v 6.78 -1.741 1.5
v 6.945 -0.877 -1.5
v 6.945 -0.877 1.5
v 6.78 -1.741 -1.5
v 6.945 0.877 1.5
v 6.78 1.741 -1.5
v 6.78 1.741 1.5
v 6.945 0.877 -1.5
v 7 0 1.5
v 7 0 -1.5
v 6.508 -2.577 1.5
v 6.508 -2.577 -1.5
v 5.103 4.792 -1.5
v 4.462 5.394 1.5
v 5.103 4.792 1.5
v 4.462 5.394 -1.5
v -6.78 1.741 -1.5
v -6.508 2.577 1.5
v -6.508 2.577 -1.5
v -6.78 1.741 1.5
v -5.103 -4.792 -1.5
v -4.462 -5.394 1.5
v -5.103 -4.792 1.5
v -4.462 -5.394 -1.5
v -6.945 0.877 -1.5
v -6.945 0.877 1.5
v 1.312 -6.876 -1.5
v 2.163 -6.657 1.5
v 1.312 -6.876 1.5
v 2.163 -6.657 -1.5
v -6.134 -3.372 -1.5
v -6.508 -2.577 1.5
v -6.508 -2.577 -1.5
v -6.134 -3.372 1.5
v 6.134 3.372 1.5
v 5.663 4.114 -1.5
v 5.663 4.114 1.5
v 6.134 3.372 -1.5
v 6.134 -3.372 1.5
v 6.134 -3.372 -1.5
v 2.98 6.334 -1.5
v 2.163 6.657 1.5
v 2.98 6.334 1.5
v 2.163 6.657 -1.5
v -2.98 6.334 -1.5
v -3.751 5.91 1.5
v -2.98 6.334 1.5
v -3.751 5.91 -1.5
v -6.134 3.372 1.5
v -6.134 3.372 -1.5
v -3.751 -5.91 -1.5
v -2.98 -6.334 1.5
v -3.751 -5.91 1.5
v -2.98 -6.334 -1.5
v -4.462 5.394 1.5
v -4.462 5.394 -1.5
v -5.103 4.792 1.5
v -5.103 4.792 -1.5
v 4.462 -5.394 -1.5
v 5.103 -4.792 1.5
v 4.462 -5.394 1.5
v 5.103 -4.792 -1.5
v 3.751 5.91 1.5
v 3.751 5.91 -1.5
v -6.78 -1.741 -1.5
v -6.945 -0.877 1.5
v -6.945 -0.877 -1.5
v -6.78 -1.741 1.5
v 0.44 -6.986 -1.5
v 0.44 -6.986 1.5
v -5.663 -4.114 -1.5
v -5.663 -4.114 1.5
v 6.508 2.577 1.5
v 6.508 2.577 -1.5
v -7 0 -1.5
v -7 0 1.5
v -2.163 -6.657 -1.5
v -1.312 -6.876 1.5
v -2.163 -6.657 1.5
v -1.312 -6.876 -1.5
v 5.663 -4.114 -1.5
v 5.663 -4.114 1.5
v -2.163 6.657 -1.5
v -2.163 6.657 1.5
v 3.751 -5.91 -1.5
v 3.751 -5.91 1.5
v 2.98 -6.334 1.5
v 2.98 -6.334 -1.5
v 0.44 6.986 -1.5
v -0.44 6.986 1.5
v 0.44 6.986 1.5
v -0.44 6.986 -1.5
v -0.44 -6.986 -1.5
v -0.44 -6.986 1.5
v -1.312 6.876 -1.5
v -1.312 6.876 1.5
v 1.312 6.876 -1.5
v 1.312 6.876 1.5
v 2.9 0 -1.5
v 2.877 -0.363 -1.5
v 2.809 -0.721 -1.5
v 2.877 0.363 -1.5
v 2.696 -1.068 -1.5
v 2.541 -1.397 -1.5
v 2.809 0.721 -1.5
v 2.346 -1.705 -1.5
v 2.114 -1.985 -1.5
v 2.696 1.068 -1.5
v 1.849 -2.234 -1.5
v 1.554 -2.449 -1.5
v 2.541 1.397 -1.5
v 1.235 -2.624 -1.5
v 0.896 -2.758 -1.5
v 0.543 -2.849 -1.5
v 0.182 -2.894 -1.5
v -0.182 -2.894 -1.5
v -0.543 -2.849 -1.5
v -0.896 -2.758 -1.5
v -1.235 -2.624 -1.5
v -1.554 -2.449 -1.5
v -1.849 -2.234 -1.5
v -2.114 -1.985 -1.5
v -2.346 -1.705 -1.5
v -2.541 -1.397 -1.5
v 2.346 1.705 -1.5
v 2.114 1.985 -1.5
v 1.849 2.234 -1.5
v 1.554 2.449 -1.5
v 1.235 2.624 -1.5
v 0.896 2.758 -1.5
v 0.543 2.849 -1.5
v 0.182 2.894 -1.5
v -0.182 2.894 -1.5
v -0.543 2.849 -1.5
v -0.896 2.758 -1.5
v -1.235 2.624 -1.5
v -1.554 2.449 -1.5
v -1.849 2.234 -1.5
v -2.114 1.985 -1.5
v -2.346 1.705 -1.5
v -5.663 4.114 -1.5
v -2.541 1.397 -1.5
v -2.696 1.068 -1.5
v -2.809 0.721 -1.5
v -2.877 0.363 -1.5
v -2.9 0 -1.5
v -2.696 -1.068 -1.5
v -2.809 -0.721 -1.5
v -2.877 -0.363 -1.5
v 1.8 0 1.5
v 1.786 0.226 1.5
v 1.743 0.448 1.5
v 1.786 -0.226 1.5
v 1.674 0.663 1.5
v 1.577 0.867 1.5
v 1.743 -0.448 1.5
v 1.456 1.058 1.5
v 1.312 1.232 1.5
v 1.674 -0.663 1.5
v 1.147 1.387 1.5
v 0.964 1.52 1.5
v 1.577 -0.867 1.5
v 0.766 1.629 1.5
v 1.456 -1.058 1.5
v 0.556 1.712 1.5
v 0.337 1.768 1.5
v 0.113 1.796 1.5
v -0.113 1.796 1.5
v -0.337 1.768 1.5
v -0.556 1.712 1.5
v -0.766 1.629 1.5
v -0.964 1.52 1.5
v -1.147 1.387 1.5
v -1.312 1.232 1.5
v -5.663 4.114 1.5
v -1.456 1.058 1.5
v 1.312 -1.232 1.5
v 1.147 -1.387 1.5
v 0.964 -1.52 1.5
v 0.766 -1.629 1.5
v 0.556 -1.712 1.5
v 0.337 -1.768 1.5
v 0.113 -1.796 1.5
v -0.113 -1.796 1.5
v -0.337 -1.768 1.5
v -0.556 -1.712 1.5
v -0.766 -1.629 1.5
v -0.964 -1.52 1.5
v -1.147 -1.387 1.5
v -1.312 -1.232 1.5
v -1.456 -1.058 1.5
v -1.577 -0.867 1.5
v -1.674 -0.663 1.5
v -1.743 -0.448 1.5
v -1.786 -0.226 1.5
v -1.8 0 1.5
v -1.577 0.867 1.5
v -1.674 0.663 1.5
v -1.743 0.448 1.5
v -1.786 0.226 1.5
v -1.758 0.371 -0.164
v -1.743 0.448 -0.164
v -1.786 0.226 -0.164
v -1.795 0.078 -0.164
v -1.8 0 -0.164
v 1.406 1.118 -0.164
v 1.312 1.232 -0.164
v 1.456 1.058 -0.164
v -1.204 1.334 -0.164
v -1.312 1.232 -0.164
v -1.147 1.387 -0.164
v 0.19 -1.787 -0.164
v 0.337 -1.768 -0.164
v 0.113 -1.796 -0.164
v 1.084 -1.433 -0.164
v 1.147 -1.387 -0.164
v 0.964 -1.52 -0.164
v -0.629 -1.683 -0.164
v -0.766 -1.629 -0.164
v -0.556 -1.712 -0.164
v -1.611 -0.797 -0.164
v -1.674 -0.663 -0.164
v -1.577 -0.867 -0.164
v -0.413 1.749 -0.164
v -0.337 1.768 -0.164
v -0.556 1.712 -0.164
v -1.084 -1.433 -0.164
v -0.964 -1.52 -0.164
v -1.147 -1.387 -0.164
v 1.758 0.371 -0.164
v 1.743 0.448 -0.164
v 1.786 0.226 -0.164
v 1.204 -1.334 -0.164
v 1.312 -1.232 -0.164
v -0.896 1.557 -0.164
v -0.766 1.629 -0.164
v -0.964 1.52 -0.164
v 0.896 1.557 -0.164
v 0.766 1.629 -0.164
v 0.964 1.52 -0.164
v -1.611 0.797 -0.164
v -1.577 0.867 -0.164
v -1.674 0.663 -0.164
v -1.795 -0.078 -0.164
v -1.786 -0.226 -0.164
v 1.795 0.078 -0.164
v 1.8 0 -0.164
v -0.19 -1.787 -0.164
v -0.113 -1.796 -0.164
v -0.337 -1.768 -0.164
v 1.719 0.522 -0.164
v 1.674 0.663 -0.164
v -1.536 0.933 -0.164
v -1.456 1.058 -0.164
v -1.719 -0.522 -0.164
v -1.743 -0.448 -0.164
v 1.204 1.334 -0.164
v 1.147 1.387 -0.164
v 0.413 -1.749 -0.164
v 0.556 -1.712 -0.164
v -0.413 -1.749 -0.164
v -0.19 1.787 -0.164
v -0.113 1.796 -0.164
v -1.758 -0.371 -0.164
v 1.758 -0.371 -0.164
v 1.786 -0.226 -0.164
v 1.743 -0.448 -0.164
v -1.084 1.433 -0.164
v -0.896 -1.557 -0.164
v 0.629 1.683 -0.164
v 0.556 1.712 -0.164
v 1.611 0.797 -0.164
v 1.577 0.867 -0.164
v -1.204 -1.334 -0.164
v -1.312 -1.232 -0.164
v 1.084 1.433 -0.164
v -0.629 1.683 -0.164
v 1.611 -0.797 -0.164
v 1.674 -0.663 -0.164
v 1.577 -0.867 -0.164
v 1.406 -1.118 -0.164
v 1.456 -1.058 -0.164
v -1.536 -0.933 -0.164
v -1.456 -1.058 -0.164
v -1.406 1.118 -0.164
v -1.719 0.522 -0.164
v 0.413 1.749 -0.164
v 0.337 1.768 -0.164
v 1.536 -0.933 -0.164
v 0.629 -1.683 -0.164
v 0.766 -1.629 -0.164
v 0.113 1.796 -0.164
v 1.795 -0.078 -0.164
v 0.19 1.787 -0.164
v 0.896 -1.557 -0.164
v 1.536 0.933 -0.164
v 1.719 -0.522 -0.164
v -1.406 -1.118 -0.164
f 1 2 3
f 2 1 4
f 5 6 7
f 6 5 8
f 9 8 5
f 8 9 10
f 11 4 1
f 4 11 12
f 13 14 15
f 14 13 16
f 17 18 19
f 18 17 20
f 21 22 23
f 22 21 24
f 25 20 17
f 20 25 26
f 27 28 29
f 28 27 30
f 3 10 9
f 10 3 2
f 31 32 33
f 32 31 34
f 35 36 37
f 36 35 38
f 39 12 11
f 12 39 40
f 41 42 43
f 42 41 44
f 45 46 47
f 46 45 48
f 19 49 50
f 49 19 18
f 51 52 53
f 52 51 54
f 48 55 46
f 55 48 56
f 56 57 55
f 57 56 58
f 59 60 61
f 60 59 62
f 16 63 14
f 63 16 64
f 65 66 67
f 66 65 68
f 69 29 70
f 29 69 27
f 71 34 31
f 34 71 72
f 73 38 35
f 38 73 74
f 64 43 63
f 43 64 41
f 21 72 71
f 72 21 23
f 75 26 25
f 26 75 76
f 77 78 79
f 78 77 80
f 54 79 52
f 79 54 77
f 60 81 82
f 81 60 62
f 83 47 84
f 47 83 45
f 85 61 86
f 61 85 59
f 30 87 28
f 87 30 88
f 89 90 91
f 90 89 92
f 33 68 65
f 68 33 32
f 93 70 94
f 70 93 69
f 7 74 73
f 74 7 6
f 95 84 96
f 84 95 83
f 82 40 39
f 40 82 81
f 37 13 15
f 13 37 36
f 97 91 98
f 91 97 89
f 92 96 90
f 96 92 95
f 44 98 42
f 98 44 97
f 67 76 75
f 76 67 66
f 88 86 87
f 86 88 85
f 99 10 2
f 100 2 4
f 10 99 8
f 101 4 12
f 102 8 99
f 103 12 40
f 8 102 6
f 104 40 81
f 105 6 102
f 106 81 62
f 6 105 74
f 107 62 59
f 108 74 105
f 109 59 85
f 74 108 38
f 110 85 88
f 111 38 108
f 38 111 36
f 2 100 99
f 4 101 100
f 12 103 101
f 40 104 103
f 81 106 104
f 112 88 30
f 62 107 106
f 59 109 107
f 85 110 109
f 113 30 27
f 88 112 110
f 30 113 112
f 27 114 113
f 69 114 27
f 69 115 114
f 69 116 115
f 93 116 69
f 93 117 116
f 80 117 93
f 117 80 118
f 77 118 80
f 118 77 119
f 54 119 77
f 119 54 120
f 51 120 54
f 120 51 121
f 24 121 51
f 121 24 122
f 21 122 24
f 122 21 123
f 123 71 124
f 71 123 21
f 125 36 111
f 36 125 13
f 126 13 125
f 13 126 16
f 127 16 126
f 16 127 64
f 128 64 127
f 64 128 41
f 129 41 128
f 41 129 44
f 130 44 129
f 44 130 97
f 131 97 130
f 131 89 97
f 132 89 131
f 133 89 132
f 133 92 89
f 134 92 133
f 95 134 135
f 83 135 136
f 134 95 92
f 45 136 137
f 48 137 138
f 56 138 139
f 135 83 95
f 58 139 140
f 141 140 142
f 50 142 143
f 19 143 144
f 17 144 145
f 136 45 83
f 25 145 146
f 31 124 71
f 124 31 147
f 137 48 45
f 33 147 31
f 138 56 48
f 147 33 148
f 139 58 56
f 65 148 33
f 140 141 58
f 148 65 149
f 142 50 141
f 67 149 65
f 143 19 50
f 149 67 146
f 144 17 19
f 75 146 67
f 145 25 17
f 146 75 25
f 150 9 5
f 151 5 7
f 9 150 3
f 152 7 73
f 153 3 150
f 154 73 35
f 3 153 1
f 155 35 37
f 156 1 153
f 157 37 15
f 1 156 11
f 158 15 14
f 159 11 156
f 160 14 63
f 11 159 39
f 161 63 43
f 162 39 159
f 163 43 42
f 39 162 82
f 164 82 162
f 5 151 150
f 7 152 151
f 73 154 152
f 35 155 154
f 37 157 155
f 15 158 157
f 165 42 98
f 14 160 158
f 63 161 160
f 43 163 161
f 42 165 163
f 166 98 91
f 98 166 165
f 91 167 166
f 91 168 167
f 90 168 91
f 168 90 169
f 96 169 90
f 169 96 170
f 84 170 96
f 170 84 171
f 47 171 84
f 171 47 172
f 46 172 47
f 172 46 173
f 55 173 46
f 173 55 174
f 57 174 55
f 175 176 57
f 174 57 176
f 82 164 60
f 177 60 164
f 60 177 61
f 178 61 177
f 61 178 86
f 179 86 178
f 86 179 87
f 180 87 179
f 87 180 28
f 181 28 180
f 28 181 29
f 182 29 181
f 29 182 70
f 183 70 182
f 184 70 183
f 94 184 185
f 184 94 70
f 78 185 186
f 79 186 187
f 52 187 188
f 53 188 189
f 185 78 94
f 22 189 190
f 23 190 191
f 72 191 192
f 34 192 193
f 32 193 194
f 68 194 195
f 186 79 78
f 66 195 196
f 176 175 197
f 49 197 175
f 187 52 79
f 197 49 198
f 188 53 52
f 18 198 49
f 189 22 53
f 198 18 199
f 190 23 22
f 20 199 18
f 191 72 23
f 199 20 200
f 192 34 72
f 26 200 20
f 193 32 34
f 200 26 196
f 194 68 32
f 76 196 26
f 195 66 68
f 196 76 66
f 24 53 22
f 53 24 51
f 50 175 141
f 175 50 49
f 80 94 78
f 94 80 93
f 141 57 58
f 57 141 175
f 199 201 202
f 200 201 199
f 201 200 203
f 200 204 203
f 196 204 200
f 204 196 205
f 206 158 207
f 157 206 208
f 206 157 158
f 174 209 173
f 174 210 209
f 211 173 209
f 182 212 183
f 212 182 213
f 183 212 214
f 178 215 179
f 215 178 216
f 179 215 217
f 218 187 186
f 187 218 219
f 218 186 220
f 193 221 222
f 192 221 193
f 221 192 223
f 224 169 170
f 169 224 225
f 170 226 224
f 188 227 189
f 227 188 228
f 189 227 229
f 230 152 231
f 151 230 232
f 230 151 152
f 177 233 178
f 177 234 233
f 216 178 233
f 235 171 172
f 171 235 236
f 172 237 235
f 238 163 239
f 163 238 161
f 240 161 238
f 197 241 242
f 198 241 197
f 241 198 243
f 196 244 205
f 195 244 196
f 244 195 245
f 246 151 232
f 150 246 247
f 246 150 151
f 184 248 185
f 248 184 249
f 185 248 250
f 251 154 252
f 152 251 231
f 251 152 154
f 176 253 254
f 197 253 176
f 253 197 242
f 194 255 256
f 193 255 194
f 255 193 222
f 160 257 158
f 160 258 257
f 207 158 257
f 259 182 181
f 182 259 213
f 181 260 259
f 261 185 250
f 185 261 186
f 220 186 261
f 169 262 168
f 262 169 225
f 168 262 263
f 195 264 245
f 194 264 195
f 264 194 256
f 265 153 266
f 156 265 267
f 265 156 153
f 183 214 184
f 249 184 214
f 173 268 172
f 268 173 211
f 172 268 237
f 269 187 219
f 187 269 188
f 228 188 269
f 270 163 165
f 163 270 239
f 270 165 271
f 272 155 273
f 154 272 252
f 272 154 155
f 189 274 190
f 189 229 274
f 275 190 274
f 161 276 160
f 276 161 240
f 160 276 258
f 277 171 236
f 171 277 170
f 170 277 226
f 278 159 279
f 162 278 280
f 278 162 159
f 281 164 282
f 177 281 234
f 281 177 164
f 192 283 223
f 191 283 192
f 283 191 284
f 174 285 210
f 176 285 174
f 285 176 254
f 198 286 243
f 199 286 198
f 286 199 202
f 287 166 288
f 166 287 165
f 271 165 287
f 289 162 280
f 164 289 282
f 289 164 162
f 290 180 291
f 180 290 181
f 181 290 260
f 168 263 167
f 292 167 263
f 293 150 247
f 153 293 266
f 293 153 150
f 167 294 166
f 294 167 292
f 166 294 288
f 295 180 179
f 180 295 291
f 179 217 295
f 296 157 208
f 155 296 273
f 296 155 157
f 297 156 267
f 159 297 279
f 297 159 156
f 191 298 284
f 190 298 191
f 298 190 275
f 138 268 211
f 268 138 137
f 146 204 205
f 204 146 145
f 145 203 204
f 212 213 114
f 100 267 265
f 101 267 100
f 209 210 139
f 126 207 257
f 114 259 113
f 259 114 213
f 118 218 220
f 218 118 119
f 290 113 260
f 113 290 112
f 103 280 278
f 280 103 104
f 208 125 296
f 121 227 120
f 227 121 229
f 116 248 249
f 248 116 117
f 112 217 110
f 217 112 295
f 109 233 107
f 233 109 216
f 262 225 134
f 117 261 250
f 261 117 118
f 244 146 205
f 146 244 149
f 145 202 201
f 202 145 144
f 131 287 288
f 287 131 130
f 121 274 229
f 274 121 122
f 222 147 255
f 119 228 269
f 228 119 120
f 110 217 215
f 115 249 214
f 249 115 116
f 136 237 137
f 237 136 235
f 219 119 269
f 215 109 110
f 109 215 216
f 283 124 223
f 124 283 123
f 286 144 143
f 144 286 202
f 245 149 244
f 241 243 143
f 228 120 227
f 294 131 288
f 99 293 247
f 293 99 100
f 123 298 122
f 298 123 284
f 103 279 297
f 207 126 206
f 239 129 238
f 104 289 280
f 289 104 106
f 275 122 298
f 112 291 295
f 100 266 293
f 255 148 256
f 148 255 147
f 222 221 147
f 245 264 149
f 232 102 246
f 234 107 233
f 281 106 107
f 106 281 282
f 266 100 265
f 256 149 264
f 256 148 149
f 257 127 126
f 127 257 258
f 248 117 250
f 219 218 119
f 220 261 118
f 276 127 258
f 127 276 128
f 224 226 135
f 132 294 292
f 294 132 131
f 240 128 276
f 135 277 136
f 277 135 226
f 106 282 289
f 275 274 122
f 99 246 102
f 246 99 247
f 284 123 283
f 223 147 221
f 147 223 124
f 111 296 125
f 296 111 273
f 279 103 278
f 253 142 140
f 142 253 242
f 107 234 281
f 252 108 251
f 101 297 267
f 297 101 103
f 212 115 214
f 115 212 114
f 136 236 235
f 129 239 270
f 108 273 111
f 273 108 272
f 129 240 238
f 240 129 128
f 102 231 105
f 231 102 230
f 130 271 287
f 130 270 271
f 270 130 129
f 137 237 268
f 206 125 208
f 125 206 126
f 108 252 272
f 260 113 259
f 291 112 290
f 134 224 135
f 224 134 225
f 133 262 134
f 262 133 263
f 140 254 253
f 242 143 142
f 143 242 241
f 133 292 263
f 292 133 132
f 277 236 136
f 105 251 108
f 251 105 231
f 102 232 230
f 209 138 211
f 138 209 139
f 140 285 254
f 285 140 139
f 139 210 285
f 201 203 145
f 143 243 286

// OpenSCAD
$fn = 50;


difference() {
	union() {
		translate(v = [0, 0, -1.5000000000]) {
			cylinder(h = 3, r = 7.0000000000);
		}
		translate(v = [0, 0, -1.5000000000]) {
			cylinder(h = 3, r = 3.0000000000);
		}
	}
	union() {
		translate(v = [0, 0, -1.5000000000]) {
			rotate(a = [0, 180, 0]) {
				difference() {
					union() {
						translate(v = [0, 0, -3.0000000000]) {
							cylinder(h = 3, r = 1.5000000000);
						}
						translate(v = [0, 0, -3.0000000000]) {
							cylinder(h = 3, r = 1.8000000000);
						}
						translate(v = [0, 0, -1.7000000000]) {
							cylinder(h = 1.7000000000, r1 = 1.5000000000, r2 = 2.9000000000);
						}
						translate(v = [0, 0, -3.0000000000]) {
							cylinder(h = 3, r = 1.5000000000);
						}
					}
					union();
				}
			}
		}
		translate(v = [0, 0, -100.0000000000]) {
			cylinder(h = 200, r = 1.5000000000);
		}
	}
}
